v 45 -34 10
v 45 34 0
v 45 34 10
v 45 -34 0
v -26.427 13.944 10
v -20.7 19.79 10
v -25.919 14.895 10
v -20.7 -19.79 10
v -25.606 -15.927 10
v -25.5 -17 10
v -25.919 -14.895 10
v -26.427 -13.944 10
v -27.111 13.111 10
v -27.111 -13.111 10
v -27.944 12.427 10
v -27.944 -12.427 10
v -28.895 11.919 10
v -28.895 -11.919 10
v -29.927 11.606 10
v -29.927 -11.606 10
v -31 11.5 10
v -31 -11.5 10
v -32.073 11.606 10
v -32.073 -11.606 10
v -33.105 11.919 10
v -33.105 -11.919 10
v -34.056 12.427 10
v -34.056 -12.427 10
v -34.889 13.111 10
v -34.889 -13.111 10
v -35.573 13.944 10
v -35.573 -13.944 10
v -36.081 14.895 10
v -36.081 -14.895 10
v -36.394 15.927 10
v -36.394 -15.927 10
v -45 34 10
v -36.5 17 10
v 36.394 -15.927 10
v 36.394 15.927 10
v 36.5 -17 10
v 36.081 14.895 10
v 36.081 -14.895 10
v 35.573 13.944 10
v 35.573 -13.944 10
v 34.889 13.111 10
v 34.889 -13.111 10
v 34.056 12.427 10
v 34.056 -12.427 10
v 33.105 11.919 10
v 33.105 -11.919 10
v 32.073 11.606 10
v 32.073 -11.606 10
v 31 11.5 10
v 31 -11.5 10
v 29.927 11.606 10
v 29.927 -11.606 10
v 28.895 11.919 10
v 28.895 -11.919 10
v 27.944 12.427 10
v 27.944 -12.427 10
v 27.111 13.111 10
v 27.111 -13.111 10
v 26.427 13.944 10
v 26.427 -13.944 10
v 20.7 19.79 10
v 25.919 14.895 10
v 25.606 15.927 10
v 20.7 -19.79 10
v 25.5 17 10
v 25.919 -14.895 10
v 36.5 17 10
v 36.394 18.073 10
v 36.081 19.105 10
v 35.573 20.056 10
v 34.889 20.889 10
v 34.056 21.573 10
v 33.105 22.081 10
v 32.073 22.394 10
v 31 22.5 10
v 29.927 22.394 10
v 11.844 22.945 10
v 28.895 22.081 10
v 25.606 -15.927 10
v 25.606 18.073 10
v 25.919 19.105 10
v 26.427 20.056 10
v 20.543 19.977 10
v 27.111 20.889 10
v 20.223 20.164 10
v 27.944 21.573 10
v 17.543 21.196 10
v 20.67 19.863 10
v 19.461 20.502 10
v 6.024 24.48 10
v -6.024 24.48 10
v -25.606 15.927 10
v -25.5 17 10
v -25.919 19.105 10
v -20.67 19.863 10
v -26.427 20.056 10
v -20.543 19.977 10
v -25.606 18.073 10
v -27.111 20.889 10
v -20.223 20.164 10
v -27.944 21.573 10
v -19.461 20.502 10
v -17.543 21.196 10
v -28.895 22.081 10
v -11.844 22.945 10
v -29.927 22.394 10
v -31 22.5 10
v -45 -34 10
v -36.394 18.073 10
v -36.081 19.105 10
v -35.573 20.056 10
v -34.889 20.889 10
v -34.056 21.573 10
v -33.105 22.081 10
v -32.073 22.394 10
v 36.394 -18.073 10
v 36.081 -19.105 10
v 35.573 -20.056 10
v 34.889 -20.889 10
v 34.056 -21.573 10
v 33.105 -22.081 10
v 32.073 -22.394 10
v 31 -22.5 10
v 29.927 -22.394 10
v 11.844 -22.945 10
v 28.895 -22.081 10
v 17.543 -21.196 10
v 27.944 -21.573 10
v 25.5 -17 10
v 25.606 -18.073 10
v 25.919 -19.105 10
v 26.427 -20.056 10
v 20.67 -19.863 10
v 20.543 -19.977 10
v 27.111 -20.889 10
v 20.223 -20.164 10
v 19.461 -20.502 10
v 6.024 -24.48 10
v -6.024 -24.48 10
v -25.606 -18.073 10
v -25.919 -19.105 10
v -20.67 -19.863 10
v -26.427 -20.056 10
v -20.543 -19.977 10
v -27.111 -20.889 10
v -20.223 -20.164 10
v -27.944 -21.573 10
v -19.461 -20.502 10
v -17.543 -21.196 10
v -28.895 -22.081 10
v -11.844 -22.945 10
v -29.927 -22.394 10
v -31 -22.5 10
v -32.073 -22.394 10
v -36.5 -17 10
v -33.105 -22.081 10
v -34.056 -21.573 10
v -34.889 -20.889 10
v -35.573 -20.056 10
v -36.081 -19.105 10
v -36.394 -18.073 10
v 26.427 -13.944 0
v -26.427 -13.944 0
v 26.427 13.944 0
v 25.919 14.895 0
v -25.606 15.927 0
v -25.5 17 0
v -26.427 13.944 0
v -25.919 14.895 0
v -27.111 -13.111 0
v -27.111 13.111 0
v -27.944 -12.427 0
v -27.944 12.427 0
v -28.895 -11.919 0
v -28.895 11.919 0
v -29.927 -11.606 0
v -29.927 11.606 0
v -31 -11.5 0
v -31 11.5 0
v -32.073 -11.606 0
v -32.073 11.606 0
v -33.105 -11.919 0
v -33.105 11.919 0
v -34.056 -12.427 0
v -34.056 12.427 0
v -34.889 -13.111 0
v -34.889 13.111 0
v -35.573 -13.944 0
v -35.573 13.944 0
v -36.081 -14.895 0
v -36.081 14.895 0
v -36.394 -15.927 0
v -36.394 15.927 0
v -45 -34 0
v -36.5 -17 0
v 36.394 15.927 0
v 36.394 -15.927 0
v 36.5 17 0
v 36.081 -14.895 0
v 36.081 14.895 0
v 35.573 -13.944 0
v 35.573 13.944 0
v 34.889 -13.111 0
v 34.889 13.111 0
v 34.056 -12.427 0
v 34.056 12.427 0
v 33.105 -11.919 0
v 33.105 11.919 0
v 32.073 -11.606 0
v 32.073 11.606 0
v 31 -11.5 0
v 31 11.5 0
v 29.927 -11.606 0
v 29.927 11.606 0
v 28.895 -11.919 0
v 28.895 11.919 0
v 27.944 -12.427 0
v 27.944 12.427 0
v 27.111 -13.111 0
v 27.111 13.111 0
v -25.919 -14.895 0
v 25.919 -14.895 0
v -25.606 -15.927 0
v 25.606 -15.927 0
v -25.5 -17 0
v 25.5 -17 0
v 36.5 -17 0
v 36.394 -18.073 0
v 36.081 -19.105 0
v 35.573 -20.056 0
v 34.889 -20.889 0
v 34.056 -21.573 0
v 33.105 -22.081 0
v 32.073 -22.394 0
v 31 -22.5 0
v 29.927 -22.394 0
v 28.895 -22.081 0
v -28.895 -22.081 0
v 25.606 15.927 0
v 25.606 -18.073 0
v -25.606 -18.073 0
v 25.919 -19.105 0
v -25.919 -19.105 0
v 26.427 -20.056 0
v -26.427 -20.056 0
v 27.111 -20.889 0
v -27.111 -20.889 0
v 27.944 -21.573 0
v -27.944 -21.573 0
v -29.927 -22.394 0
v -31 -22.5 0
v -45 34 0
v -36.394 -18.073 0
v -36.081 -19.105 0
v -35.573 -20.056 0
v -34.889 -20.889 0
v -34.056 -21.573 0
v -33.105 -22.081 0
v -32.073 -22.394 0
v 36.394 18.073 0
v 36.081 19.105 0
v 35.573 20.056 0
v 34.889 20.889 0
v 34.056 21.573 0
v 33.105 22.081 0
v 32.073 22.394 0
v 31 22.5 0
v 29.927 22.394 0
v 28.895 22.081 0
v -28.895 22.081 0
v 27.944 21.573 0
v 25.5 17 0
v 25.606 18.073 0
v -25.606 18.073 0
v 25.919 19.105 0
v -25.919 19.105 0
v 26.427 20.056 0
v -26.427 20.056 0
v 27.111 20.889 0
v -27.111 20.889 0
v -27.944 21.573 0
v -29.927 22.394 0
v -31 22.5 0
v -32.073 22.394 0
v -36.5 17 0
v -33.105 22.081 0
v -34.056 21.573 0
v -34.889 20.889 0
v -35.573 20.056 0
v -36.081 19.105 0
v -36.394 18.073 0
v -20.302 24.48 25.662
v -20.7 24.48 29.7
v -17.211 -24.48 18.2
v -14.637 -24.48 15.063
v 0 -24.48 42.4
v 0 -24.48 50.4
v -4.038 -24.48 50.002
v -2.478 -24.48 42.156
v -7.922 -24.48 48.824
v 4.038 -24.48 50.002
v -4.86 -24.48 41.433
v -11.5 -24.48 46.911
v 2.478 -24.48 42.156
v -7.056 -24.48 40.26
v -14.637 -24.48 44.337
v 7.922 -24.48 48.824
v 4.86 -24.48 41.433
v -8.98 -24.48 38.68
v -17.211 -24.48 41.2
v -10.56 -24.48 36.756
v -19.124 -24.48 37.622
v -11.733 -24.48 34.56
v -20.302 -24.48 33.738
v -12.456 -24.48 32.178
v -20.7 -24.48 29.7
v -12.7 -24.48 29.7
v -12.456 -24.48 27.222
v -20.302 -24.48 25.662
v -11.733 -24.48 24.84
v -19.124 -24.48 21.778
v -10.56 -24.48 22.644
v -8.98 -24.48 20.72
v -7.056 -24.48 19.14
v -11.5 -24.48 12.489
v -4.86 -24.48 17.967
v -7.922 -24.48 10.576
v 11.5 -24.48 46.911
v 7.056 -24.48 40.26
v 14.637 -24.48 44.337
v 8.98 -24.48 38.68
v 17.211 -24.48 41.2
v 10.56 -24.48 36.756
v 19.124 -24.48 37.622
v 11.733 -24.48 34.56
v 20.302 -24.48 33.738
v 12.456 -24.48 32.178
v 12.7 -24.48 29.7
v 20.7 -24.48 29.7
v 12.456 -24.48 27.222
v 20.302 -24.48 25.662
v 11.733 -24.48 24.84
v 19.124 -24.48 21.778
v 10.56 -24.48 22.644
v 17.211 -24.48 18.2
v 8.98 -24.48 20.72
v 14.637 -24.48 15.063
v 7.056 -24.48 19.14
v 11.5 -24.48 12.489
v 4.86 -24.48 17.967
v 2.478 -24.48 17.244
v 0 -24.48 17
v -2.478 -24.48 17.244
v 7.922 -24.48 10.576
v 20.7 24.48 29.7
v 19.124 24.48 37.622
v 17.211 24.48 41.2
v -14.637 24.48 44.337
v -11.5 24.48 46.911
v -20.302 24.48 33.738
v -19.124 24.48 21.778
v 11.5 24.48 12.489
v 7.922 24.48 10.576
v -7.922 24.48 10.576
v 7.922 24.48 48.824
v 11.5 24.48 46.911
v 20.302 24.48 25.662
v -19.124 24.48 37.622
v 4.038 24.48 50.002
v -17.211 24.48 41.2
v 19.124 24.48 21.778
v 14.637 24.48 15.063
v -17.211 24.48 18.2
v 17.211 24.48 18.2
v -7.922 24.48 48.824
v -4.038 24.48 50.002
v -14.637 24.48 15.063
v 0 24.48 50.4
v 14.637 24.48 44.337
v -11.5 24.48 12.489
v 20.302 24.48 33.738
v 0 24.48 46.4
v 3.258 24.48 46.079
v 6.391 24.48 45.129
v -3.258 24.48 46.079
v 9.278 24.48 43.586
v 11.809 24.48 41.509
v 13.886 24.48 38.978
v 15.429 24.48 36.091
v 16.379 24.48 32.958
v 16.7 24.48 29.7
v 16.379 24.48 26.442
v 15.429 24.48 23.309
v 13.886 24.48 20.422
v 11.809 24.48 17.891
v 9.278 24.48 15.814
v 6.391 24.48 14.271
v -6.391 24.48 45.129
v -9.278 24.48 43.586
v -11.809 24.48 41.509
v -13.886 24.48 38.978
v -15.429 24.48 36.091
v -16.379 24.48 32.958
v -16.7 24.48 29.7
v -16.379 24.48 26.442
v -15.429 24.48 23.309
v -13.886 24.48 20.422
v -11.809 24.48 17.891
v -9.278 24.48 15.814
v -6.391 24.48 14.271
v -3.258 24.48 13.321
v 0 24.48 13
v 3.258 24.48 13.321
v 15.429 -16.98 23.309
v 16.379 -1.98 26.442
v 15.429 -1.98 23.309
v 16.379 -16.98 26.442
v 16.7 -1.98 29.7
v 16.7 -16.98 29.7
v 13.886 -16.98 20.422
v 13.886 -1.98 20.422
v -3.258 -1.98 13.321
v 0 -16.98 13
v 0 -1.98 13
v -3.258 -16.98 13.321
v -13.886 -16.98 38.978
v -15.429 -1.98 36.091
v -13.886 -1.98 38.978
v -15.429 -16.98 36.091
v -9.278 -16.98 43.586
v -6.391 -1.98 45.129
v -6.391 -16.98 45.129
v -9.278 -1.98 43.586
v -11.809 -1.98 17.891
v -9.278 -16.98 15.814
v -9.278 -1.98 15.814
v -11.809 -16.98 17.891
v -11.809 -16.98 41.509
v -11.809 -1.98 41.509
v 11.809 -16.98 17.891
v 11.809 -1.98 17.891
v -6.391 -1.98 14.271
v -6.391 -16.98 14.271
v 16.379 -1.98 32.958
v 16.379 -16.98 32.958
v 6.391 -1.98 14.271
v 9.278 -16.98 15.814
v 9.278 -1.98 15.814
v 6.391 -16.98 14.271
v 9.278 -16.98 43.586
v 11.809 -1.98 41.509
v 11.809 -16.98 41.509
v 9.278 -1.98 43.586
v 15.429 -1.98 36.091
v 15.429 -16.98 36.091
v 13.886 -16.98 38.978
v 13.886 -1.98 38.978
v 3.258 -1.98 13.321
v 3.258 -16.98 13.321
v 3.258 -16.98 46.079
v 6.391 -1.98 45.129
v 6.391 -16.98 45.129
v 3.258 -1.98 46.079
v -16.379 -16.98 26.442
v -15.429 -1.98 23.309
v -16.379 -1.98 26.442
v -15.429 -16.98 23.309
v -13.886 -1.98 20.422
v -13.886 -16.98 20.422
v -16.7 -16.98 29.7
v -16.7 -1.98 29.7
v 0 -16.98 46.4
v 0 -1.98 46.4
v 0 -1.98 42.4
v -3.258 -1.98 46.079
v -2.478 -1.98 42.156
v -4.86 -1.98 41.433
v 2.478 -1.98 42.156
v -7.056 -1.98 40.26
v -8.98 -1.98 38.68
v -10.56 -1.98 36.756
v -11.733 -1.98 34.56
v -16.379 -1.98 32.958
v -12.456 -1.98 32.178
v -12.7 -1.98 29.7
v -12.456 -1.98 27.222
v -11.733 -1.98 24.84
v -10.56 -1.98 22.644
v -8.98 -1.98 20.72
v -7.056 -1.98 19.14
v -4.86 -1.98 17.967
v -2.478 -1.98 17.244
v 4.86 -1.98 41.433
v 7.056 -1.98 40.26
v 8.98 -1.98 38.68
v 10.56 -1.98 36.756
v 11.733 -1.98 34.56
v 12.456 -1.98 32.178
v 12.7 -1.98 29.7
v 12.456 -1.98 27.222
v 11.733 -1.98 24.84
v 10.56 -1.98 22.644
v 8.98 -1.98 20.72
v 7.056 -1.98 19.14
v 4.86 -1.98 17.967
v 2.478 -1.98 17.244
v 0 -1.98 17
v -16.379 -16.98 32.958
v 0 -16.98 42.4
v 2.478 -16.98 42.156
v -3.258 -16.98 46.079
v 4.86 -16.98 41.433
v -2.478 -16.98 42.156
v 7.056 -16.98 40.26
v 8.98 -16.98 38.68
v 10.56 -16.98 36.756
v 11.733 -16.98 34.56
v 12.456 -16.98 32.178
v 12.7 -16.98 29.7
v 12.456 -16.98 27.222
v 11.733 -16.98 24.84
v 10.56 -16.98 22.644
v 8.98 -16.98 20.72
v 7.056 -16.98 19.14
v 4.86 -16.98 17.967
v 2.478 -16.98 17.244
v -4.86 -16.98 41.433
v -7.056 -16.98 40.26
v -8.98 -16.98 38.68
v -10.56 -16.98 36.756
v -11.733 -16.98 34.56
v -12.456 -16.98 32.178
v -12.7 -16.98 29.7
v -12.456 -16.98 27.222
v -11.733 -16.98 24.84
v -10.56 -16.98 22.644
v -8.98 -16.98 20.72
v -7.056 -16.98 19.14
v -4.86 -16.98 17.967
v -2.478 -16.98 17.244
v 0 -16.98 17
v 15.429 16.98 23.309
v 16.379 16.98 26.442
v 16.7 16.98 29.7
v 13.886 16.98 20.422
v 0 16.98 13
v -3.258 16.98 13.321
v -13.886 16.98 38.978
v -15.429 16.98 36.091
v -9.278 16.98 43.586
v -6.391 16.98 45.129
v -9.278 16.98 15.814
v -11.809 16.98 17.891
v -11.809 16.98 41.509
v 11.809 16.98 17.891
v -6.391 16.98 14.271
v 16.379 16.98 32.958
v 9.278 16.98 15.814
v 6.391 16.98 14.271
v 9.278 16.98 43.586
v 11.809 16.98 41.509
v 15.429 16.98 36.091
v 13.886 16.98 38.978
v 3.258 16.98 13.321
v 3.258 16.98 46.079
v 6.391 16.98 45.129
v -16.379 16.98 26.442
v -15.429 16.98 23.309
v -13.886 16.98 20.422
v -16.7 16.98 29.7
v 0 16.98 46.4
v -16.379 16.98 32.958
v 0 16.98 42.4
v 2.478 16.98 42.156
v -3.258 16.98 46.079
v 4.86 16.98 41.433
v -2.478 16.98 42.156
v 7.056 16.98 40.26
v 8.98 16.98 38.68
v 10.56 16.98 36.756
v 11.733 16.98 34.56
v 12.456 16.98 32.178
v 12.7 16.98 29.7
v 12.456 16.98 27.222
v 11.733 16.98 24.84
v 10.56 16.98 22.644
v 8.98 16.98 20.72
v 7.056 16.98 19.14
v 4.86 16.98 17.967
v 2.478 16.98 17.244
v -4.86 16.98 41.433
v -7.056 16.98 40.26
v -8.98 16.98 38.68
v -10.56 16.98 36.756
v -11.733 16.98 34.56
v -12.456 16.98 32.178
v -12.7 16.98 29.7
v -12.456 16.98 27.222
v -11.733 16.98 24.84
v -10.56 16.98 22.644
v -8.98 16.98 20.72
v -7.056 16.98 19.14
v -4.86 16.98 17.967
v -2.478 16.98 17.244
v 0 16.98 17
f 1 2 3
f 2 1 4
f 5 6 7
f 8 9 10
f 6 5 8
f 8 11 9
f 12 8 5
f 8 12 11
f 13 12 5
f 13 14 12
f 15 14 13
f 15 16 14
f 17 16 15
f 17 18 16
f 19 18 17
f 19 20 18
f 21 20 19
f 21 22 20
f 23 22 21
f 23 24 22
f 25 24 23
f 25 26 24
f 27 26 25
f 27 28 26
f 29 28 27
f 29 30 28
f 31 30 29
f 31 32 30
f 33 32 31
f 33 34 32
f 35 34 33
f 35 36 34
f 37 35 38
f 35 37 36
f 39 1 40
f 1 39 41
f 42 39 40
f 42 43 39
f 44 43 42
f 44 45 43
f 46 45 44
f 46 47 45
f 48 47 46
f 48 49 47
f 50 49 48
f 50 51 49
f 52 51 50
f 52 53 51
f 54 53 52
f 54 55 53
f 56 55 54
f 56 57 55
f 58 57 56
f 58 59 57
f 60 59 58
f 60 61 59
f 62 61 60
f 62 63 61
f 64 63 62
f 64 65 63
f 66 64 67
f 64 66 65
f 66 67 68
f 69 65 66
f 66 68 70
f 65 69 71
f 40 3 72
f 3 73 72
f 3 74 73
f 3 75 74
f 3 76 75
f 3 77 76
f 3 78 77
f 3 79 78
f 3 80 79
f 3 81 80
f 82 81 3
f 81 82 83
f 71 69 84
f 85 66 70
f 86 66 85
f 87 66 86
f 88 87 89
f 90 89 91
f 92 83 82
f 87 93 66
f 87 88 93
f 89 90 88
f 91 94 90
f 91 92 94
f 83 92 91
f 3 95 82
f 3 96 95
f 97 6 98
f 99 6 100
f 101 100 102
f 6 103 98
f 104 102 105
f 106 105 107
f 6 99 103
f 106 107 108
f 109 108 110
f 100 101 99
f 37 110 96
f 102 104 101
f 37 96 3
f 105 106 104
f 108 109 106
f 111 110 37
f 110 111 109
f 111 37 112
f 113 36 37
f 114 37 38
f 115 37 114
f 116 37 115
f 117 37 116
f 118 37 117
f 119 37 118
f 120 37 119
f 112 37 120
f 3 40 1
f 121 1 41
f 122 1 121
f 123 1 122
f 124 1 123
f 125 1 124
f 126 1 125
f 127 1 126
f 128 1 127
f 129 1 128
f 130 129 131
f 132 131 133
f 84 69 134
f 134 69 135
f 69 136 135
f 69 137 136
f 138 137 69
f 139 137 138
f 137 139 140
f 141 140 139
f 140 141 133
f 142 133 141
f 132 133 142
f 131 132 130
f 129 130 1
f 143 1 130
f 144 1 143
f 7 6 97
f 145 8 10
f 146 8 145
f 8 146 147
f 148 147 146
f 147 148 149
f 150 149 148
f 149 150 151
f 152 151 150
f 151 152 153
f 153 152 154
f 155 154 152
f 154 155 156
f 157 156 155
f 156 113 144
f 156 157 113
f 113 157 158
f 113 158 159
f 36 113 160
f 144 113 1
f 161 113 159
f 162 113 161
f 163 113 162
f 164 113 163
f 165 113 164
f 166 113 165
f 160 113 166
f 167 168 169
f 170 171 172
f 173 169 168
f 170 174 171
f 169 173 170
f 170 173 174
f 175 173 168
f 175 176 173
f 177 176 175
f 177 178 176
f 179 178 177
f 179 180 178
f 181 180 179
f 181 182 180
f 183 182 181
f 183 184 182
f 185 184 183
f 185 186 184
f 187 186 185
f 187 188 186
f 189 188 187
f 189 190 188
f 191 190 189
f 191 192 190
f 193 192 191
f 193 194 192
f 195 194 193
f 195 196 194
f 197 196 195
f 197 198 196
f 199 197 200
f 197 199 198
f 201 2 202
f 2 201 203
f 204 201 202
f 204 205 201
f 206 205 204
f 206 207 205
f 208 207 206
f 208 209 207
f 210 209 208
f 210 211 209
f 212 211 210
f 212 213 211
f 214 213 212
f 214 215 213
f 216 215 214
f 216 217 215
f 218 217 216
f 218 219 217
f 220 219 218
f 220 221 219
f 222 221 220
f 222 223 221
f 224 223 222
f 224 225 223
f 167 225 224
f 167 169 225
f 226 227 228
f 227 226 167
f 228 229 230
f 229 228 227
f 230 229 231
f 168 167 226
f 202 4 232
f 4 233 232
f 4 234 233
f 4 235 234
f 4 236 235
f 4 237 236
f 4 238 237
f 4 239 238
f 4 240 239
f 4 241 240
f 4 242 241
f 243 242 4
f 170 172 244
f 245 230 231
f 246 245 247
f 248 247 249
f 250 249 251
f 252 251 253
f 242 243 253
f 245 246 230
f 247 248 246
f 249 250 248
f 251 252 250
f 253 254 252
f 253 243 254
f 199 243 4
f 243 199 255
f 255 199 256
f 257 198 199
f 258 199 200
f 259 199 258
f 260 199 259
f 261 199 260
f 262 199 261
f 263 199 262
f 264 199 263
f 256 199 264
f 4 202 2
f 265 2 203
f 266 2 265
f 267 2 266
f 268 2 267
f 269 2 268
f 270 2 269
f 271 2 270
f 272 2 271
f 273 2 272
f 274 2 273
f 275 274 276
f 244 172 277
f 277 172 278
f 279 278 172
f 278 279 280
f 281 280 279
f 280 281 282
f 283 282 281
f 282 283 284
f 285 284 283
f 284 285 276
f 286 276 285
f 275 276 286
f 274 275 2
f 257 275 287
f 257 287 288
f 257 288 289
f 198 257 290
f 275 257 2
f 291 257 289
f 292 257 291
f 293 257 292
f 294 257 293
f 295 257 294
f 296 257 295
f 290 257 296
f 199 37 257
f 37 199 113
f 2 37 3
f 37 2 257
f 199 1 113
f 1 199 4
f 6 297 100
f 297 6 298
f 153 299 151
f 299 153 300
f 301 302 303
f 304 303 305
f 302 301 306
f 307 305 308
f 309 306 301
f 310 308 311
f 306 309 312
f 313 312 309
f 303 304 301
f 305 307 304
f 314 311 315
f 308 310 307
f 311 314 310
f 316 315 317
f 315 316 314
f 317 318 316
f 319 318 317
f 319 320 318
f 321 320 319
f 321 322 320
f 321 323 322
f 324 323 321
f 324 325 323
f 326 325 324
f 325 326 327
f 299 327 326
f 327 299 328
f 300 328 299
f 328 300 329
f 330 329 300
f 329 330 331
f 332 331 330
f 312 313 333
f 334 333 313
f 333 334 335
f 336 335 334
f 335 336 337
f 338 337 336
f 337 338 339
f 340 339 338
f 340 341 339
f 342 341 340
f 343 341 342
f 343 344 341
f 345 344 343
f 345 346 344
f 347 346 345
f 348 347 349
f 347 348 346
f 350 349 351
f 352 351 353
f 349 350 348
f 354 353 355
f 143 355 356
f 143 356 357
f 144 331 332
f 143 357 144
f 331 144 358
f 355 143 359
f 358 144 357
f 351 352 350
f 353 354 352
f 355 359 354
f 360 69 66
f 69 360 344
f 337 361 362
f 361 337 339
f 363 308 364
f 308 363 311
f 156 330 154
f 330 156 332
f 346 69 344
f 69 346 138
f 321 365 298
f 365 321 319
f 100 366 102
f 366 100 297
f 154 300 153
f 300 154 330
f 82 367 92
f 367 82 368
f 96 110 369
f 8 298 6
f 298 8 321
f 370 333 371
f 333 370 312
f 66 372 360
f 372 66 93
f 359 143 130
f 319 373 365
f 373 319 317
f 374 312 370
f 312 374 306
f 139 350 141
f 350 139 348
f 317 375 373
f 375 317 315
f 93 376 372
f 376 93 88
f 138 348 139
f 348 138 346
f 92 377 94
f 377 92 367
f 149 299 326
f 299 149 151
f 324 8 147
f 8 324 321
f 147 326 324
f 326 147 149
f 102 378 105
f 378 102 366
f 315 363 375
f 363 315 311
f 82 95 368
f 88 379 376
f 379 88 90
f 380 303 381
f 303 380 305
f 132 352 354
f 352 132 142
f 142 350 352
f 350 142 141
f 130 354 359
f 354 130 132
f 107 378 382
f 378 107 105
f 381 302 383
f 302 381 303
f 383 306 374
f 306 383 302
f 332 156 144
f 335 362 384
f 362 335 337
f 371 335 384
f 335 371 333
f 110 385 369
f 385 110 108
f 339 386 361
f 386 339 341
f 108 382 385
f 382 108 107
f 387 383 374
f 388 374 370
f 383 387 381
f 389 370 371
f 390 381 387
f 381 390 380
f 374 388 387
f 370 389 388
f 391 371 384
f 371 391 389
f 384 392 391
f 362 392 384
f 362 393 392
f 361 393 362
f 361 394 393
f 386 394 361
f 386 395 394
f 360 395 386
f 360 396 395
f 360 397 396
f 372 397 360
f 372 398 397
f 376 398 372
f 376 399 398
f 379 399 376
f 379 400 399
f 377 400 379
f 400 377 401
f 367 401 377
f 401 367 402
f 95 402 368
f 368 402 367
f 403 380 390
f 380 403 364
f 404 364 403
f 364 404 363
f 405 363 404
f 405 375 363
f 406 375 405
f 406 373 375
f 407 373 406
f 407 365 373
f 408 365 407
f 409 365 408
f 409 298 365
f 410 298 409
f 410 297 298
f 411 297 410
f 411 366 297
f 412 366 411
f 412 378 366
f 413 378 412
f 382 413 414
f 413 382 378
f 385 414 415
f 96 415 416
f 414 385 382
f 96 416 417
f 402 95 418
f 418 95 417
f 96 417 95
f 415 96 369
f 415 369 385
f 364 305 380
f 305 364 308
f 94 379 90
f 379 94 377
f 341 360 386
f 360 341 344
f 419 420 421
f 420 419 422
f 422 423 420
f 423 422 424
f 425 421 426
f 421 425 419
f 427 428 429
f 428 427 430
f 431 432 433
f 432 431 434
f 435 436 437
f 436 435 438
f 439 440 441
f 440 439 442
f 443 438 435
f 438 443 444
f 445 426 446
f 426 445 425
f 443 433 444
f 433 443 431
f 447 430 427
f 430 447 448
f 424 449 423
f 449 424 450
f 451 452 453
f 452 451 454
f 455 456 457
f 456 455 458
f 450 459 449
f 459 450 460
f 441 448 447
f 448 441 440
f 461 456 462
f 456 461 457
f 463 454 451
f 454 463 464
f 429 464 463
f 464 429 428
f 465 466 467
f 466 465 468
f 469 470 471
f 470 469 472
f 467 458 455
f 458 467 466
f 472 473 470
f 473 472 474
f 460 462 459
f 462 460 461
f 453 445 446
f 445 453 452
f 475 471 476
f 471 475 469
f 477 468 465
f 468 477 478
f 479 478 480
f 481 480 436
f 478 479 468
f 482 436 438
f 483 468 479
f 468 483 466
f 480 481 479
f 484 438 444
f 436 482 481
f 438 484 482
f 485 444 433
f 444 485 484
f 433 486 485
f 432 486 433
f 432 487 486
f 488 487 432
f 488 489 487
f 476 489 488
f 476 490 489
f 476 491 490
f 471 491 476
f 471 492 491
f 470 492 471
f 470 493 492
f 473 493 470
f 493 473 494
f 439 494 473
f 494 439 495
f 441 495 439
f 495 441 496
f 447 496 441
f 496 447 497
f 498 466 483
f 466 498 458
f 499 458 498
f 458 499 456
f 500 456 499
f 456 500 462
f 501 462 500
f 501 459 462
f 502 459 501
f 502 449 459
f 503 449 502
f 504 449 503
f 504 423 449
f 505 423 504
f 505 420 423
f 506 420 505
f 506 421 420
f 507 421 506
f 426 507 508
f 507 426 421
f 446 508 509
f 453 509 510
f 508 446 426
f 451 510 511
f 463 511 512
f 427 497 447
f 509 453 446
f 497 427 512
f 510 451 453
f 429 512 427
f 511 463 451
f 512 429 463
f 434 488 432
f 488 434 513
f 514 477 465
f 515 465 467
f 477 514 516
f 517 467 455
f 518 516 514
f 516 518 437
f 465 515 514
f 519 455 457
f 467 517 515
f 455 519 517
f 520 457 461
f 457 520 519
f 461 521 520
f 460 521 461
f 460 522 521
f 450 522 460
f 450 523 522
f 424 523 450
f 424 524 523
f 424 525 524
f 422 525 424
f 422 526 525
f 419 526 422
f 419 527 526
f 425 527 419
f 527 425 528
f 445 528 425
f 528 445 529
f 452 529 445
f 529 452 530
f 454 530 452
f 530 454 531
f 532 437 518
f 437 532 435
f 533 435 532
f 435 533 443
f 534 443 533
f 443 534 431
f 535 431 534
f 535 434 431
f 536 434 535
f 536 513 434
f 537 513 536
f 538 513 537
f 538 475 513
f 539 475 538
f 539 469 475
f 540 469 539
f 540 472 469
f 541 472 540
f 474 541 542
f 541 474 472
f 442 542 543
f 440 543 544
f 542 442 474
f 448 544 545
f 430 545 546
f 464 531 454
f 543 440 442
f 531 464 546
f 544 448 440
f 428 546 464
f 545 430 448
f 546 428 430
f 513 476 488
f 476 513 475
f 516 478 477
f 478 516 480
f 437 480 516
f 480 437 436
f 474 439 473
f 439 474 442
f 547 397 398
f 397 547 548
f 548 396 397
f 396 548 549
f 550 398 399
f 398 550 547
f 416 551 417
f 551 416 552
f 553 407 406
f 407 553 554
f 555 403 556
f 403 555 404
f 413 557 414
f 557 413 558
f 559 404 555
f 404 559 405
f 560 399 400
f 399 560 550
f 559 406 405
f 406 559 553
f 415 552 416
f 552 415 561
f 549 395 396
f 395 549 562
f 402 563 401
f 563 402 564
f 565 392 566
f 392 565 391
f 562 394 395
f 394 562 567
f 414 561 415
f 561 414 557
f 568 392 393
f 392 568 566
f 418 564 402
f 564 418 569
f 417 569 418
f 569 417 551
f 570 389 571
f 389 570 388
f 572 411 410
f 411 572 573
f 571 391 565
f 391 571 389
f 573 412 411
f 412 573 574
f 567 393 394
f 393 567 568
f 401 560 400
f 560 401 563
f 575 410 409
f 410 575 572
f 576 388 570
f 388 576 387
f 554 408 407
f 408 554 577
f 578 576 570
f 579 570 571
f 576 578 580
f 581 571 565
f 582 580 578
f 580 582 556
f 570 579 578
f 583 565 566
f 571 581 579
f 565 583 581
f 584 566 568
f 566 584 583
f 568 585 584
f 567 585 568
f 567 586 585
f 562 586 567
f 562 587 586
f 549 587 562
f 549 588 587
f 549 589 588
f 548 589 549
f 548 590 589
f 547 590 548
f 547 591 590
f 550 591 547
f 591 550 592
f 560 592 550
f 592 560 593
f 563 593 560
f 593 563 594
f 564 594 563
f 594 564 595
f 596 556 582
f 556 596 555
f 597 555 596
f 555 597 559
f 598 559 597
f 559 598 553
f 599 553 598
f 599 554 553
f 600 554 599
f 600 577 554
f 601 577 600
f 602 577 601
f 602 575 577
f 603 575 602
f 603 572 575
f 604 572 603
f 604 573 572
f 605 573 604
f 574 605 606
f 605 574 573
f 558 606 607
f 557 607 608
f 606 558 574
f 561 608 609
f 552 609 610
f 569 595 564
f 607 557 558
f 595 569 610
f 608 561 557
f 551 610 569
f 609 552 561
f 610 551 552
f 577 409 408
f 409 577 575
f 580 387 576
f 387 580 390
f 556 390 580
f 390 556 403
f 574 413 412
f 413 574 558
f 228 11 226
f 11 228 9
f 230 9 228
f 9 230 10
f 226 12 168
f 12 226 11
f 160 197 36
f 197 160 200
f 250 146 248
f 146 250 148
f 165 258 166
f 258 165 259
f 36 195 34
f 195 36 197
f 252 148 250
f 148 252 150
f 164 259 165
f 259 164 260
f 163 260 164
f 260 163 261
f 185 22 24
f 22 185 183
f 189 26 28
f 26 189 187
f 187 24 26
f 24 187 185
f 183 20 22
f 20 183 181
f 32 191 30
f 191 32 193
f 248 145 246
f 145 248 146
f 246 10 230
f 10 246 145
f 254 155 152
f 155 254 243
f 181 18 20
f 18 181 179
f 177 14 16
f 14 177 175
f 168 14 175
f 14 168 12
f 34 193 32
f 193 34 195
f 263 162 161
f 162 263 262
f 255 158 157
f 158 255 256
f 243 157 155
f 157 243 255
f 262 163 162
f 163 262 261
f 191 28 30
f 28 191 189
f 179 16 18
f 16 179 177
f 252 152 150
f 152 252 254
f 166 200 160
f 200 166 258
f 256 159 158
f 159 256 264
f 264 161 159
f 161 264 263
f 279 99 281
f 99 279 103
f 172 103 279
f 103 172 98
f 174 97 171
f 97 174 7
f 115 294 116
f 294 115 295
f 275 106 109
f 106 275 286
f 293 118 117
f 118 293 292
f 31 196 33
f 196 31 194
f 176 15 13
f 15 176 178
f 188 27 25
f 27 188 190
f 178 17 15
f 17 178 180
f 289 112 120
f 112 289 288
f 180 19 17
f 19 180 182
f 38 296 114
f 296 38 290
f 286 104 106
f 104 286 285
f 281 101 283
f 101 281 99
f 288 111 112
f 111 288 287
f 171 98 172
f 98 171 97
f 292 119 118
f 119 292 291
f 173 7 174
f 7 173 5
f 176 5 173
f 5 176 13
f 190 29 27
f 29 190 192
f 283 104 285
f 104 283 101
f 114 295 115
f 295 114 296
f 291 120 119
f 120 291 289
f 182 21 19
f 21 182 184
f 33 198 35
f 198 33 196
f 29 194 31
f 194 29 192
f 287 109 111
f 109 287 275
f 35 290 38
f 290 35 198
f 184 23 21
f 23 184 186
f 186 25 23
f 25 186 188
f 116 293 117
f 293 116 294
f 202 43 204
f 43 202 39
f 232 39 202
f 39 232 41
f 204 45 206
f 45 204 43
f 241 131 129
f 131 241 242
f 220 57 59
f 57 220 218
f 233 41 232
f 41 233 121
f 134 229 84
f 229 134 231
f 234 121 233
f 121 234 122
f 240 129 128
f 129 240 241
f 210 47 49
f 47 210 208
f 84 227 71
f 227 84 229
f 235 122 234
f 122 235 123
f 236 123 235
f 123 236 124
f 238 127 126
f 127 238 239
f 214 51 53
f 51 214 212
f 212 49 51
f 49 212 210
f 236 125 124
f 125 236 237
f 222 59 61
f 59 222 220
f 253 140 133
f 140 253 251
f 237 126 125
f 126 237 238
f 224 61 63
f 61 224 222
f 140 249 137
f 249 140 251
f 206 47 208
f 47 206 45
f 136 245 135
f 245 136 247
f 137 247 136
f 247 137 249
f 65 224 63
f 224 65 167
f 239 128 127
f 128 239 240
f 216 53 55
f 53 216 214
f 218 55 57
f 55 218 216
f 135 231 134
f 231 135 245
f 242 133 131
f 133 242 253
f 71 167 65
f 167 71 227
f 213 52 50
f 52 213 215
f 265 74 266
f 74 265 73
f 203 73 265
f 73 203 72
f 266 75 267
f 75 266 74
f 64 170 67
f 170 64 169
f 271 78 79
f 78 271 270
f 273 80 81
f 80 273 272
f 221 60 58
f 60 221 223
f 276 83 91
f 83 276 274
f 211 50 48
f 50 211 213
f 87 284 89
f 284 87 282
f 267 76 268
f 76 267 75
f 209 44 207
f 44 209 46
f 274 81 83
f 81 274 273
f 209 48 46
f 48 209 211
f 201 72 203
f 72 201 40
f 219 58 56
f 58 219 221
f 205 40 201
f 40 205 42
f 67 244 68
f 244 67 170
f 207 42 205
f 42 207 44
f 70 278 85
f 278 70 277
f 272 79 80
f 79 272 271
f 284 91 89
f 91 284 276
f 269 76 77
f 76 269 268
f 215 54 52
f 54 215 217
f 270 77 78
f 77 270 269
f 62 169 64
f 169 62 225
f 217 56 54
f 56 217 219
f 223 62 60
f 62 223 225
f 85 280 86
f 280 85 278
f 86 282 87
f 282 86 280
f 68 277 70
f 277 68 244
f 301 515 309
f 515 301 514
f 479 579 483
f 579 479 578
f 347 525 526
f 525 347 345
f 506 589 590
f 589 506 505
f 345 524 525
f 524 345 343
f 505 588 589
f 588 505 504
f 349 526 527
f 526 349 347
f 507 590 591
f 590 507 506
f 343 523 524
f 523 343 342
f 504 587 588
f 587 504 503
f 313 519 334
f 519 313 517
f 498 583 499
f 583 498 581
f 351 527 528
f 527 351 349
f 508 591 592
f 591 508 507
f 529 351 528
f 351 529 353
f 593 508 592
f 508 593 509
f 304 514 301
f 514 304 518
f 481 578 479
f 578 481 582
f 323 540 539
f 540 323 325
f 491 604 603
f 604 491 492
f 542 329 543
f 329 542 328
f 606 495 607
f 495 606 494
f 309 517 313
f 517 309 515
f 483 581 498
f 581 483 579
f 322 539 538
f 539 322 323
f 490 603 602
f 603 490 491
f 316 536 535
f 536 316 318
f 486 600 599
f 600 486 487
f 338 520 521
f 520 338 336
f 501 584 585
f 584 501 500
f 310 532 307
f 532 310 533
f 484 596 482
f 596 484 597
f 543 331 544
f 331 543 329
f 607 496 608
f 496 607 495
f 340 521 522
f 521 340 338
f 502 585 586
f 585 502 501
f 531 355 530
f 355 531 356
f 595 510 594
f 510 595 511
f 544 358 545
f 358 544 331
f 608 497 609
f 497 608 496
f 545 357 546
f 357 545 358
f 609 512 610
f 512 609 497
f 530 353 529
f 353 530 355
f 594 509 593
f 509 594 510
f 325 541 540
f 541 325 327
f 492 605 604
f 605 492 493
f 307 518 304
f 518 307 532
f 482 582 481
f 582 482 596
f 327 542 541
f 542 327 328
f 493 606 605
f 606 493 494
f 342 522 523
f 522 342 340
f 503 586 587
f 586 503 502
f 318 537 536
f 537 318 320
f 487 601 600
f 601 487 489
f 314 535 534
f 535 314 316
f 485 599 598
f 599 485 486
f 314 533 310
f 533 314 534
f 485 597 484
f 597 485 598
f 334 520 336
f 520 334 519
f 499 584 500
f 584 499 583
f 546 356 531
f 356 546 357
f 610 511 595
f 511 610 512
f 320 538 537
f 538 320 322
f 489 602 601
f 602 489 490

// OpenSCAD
$fn = 32;

// ----------------------------------------------------------------------
// Bearing block: 90 x 68 mm base, 25.4 mm bore at 29.7 mm
// ----------------------------------------------------------------------

// --- parameters (mm) ---
base_w = 90;              // base width
base_d = 68;              // base depth
base_t = 10;              // base thickness
bore_d = 25.4;            // shaft / bearing bore
house_r = 20.7;           // housing outer radius
house_len = 48.96;        // housing length along the shaft
foot_w = 41.4;            // foot width under the housing
foot_len = 38.96;         // foot length along the shaft
axis_z = 29.7;            // bore axis height above the base
holes_d = 11;             // mounting holes
hole_x = 31;              // mounting hole spacing
seat_d = 10;              // bearing seat depth
seat_wall = 4;            // seat wall thickness

difference() {
  union() {
    /* base plate with its underside on z = 0 */
    translate([0, 0, base_t / 2]) cube([base_w, base_d, base_t], center = true);
    /* hull foot: a straight web blending into the round housing */
    hull() {
      translate([0, 0, base_t - 0.5]) cube([foot_w, foot_len, 1.6], center = true);
      translate([0, 0, axis_z]) rotate([-90, 0, 0]) cylinder(h = house_len, d = 2 * house_r, center = true);
    }
  }
  /* bore through the housing, 2.5 mm clear on both sides */
  translate([0, 0, axis_z]) rotate([-90, 0, 0]) cylinder(h = house_len + 5, d = bore_d, center = true);
  /* bearing seats, recessed into both ends of the housing */
  for (sy = [-1, 1]) {
    translate([0, sy * (house_len / 2 - seat_d + 2.5), axis_z]) rotate([-90, 0, 0]) cylinder(h = seat_d + 5, d = bore_d + 2 * seat_wall);
  }
  /* mounting holes through the base plate */
  for (hx = [-31, 31]) {
    for (hy = [-17, 17]) {
      translate([hx, hy, -2.5]) cylinder(h = base_t + 5, d = holes_d);
    }
  }
}
